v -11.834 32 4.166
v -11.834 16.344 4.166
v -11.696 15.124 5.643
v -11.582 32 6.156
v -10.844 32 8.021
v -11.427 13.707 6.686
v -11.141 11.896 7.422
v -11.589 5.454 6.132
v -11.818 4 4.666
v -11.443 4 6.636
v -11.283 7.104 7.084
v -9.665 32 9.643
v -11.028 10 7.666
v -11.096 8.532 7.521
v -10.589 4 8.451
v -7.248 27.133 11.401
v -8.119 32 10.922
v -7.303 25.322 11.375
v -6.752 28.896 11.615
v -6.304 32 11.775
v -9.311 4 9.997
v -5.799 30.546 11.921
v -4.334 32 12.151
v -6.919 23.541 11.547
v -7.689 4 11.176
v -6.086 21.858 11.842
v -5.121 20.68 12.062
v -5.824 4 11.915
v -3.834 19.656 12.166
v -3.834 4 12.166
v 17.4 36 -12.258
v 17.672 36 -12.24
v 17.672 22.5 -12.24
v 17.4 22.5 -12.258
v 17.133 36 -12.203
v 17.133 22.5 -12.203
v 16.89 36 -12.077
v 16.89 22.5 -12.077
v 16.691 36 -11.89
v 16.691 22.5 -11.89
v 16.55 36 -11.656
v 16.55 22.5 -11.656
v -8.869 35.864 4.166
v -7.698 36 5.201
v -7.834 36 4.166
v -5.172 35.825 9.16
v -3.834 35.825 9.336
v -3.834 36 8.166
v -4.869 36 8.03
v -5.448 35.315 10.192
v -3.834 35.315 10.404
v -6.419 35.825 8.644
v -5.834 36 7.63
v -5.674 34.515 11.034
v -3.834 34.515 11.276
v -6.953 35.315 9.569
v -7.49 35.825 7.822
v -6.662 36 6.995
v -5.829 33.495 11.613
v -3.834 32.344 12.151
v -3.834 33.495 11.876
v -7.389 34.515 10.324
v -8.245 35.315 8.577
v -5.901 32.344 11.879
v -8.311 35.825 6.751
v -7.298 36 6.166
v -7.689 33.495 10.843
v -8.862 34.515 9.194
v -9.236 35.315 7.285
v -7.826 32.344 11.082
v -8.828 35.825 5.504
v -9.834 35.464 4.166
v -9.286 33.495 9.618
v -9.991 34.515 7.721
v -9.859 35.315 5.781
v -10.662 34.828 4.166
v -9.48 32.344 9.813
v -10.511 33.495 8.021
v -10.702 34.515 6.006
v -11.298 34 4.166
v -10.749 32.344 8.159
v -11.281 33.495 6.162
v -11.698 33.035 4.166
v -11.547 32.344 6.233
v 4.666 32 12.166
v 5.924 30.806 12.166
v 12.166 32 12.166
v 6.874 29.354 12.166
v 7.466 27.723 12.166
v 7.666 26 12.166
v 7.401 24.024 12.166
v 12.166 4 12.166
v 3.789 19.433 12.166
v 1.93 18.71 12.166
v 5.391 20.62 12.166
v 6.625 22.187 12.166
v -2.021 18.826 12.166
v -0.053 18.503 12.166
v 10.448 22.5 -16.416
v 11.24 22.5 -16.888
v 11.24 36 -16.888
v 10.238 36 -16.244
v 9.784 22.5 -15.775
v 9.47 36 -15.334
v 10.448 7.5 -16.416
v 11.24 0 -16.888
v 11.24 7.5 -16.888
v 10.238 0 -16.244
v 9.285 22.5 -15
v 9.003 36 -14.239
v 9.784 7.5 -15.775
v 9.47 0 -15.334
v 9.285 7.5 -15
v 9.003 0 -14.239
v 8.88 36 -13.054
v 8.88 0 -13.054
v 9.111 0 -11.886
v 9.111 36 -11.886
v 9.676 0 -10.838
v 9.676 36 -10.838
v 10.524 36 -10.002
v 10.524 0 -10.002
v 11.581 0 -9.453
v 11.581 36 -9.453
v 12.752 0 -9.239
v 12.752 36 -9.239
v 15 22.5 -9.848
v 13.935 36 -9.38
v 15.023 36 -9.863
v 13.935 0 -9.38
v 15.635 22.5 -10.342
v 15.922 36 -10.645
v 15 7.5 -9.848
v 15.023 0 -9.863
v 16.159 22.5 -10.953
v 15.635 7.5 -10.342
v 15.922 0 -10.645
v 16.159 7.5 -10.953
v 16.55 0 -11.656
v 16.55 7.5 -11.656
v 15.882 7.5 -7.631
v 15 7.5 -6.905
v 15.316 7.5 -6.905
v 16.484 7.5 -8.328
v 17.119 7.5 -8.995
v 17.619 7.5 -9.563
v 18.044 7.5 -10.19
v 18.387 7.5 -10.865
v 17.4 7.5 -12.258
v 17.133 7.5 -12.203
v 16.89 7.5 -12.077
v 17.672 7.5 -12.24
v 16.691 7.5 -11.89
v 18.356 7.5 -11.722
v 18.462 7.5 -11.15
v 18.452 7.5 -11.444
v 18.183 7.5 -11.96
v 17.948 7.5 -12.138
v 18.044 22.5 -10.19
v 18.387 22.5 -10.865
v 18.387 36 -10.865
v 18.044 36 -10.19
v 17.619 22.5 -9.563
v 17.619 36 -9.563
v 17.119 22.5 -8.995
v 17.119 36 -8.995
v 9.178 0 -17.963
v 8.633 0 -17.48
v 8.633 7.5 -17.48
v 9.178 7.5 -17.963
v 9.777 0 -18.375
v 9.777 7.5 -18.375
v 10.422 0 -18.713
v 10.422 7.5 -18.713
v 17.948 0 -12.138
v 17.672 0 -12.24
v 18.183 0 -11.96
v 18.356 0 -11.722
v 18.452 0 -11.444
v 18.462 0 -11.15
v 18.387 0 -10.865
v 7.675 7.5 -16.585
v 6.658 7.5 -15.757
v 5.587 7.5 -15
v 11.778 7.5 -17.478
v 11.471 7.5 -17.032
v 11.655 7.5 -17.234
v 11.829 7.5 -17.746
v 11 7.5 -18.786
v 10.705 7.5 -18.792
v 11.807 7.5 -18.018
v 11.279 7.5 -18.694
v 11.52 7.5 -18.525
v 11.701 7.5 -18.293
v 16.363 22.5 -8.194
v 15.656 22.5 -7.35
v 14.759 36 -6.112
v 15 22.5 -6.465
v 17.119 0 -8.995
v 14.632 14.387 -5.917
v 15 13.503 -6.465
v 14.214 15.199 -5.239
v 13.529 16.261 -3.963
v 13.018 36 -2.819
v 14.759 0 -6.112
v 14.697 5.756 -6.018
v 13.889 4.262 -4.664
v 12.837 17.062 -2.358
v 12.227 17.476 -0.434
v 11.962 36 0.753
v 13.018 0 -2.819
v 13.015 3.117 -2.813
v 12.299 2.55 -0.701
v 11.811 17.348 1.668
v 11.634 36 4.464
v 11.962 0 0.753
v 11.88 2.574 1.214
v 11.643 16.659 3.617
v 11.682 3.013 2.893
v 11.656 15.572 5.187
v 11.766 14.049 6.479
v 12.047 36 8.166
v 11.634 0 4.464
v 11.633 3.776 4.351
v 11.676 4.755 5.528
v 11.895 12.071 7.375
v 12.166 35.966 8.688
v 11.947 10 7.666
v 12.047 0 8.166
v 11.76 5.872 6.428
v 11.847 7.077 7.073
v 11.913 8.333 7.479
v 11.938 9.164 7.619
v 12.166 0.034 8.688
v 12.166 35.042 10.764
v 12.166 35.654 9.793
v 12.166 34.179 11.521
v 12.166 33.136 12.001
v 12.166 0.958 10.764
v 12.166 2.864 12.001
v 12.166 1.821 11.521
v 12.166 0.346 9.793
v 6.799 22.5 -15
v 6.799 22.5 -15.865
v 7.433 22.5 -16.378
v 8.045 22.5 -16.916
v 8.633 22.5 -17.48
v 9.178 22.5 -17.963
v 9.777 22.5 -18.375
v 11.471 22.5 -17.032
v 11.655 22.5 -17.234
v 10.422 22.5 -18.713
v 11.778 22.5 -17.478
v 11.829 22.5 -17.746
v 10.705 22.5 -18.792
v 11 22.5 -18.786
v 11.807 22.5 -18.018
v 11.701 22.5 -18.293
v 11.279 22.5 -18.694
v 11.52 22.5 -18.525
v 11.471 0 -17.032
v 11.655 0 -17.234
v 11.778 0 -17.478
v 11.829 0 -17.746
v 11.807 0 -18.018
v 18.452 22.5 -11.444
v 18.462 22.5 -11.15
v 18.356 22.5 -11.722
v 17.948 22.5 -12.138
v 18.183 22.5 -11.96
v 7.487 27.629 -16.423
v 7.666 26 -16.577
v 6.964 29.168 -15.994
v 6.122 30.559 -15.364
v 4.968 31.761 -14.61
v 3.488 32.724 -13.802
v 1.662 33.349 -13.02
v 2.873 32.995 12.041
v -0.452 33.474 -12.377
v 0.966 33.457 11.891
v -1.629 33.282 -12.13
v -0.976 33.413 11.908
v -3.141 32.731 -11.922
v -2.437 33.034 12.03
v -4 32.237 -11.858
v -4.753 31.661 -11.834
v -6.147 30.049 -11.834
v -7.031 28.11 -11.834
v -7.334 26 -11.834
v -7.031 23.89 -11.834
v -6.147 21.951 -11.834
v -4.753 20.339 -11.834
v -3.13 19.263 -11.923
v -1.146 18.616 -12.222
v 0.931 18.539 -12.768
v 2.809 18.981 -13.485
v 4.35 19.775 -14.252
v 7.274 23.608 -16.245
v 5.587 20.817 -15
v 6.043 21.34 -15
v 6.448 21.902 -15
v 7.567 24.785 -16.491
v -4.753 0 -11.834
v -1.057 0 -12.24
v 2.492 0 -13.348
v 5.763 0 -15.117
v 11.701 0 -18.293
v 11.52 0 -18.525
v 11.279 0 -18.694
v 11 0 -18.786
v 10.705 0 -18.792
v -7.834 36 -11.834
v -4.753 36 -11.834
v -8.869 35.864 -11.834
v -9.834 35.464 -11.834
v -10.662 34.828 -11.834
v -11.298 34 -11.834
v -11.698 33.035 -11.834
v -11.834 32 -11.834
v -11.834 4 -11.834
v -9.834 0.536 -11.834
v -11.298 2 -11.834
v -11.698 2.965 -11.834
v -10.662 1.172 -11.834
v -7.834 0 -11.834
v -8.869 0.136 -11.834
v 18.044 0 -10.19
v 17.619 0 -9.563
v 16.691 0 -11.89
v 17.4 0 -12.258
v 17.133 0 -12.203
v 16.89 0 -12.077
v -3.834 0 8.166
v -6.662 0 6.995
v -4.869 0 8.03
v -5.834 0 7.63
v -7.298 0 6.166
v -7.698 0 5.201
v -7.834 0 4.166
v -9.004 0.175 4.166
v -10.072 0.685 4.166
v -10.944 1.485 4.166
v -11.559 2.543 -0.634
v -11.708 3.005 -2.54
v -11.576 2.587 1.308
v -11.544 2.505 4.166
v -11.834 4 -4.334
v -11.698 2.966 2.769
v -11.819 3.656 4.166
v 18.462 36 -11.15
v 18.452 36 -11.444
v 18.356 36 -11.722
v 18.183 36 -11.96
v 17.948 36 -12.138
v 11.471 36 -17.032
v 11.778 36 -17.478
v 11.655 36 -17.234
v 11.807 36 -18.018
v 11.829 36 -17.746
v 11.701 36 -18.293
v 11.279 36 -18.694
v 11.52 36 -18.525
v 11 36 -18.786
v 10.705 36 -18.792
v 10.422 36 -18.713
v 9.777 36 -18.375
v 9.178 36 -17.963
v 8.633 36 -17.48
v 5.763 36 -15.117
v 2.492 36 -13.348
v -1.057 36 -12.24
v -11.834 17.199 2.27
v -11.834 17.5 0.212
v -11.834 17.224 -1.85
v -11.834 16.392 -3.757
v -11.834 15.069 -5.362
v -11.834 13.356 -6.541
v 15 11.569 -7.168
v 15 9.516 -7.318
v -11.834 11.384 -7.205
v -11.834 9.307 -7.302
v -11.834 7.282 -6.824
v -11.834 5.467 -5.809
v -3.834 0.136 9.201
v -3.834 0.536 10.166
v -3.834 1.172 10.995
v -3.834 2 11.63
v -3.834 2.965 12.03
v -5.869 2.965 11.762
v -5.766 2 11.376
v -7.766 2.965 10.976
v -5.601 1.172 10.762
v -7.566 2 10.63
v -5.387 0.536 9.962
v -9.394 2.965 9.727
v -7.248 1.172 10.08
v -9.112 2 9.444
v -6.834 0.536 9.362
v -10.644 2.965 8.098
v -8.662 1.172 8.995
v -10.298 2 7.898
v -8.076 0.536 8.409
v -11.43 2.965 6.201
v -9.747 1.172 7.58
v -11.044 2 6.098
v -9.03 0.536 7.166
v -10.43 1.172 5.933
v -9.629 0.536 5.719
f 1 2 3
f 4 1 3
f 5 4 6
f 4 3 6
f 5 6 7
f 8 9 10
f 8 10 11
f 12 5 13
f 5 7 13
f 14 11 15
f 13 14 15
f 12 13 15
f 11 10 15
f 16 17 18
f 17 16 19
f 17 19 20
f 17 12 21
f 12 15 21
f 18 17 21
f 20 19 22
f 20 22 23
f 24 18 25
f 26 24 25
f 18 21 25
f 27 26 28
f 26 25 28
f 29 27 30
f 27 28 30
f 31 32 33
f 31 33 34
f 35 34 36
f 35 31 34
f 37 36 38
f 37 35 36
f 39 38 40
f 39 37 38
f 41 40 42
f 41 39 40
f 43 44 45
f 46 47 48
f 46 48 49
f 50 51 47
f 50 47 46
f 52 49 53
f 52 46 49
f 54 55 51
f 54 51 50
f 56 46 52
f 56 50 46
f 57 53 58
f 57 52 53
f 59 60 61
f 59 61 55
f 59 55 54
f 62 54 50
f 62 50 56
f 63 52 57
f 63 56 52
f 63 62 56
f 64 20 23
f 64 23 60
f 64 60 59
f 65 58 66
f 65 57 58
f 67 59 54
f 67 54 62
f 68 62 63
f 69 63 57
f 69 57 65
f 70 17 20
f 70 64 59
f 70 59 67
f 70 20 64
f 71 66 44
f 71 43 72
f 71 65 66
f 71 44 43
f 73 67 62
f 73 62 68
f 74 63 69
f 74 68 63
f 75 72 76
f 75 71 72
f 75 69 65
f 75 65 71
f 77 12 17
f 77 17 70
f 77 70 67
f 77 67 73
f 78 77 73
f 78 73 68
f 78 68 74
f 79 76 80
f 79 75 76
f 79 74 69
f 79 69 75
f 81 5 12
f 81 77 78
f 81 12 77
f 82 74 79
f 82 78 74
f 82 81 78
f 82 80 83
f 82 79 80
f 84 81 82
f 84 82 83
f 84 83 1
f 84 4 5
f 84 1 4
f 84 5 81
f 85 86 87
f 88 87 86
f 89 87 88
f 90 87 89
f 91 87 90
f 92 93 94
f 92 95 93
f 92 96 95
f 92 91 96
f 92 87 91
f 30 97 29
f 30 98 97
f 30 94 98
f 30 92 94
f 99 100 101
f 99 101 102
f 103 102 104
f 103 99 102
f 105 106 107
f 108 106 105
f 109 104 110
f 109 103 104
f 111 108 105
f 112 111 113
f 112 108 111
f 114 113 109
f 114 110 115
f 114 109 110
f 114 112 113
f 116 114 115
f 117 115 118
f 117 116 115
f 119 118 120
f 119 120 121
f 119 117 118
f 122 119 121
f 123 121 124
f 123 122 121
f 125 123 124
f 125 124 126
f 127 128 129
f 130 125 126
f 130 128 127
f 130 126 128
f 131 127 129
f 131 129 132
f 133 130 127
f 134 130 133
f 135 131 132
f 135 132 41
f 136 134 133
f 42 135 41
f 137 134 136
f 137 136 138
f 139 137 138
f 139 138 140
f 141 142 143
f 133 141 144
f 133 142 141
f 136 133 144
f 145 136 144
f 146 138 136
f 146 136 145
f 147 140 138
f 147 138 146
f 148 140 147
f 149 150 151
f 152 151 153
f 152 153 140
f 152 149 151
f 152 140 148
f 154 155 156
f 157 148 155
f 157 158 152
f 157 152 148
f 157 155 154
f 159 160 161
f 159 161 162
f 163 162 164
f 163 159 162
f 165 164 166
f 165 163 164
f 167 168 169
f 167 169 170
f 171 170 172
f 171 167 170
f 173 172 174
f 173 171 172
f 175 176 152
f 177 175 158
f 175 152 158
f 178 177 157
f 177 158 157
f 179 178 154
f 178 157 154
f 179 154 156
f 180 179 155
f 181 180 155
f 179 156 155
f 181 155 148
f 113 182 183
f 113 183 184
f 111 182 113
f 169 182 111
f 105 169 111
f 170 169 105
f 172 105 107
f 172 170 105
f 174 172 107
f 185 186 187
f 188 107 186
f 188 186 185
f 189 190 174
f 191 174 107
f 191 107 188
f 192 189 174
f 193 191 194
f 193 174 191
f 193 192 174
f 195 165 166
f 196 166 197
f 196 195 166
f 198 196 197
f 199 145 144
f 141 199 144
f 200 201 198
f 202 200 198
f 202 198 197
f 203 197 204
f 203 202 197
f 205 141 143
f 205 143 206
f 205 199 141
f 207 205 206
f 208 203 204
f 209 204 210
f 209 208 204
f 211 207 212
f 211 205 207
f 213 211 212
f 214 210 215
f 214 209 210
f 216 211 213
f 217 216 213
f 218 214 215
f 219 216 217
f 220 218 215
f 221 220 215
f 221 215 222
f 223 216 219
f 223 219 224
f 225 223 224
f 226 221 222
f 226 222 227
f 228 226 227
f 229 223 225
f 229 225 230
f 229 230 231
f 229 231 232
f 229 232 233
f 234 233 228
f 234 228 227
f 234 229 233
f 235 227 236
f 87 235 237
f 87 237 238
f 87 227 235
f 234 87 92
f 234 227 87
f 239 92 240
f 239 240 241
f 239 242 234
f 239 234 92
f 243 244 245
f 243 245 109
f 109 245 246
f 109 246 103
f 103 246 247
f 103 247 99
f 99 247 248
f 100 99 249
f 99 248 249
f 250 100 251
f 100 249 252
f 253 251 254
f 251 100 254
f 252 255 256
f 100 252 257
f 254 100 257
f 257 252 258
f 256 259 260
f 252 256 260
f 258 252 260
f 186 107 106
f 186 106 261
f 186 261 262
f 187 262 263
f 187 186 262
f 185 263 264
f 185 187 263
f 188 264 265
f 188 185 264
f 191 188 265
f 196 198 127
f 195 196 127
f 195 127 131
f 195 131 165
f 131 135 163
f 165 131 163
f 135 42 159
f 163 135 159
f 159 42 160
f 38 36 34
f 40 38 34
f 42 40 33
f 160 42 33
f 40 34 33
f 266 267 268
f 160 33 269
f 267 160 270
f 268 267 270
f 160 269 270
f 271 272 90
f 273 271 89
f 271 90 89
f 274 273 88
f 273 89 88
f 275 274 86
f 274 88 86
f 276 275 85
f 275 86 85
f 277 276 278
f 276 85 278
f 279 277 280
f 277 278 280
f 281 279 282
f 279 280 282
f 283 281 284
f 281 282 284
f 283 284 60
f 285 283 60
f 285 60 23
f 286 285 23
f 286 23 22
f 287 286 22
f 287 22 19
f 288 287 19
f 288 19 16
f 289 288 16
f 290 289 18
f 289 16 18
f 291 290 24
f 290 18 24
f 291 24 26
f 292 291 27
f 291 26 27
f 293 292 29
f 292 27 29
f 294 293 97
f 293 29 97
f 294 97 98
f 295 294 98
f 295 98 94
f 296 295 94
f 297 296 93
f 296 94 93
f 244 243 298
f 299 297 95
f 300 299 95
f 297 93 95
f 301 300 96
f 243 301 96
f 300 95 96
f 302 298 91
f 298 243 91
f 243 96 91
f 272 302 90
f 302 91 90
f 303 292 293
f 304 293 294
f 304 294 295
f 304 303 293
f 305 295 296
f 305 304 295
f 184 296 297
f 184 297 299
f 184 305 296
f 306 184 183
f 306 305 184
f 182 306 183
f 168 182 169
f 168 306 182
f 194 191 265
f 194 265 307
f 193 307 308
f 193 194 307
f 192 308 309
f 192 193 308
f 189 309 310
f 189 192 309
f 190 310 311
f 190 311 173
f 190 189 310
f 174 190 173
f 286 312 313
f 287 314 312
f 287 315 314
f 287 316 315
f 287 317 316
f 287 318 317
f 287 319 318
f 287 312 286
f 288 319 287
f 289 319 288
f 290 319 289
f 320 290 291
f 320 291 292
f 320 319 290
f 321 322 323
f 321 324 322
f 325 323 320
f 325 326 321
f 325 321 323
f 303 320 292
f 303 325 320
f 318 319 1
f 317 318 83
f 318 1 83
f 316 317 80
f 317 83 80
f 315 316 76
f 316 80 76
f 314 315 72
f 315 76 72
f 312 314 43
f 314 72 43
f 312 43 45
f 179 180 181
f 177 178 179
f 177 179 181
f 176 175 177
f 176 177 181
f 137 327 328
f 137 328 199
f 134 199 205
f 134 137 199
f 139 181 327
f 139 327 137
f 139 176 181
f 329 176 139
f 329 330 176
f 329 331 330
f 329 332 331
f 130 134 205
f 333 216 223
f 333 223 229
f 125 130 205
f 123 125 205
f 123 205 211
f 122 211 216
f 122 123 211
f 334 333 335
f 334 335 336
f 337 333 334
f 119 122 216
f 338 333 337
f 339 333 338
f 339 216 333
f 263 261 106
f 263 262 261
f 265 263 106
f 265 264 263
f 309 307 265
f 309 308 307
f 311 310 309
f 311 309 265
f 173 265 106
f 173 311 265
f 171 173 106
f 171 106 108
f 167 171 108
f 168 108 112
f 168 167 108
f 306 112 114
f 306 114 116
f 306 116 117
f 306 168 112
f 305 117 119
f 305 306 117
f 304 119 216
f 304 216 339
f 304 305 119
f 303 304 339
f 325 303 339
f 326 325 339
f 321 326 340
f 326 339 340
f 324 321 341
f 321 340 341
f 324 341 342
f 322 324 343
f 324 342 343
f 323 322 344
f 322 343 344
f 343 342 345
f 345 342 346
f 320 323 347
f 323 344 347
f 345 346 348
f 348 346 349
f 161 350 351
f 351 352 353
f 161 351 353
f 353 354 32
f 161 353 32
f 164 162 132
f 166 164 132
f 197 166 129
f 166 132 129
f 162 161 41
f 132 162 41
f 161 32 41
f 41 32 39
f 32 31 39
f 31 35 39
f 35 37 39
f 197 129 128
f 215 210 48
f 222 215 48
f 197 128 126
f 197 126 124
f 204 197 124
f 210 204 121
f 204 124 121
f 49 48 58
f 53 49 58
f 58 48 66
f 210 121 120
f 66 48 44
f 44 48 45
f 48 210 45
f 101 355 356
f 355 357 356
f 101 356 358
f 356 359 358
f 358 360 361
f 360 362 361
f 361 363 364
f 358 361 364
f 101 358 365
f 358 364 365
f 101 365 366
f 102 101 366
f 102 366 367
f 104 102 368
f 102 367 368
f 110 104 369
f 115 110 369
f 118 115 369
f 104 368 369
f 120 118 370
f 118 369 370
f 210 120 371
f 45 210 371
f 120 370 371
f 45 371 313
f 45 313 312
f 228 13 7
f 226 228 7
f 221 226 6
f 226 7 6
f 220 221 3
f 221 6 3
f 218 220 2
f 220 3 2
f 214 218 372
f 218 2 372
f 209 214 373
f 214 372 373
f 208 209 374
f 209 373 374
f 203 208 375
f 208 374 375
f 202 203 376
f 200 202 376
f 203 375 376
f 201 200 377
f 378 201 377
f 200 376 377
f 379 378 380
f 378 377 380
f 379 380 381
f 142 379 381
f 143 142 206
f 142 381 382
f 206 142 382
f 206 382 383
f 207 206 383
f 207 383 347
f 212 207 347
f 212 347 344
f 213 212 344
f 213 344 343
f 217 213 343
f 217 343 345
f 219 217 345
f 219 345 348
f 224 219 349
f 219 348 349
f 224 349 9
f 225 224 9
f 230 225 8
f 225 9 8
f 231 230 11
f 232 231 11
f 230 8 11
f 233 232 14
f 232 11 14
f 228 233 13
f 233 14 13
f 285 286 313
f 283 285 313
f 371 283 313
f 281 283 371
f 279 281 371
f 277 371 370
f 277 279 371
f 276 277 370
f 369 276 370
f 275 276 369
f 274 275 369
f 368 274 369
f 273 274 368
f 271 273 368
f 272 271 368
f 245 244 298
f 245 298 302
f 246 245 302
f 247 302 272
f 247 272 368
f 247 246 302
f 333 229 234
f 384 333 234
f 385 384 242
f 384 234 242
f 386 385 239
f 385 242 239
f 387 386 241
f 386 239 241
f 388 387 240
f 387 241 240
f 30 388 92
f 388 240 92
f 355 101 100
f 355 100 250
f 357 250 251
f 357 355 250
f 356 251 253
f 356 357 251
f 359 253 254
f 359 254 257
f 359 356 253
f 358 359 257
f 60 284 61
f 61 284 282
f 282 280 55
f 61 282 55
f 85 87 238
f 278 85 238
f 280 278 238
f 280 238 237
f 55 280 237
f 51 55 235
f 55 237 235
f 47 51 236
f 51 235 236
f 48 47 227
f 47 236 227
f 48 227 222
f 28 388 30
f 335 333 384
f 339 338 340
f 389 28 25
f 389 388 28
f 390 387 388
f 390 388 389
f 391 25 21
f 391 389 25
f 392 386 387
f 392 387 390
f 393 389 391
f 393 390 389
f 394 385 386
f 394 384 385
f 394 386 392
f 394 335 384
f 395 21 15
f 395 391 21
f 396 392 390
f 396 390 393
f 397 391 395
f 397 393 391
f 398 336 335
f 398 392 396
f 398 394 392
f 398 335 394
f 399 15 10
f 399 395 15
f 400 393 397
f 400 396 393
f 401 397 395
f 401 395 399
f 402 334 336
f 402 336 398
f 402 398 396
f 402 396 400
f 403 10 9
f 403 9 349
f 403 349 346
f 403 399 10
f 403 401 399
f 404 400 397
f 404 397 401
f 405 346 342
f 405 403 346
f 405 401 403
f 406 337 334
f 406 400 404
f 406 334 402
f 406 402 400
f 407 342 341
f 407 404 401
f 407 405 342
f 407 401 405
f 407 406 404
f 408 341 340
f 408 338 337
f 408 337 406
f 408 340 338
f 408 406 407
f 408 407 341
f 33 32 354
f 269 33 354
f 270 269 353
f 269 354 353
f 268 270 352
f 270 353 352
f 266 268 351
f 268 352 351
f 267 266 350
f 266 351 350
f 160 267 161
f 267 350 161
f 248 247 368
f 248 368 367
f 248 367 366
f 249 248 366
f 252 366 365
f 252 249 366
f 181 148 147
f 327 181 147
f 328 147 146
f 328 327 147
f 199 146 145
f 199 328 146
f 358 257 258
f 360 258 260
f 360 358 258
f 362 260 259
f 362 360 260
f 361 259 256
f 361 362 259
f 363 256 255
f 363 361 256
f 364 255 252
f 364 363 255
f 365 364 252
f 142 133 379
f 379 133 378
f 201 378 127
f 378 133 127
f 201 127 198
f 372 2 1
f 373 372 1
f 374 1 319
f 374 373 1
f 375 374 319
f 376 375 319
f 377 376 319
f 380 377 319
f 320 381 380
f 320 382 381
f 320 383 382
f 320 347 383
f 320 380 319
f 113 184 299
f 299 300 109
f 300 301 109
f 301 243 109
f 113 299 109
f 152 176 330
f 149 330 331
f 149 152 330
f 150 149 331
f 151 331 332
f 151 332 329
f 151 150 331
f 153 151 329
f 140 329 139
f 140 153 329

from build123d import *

# Parameters (mm, degrees)
BOSS_EXTRUDE1_DEPTH = 36
SKETCH2_R           = 7.5
CUT_EXTRUDE1_DEPTH  = 51.950145011
SKETCH3_R           = 7.5
CUT_EXTRUDE2_DEPTH  = 52.231763324
FILLET1_R           = 8
FILLET2_R           = 4
FILLET3_R           = 1
FILLET4_R           = 1
CUT_EXTRUDE3_DEPTH  = 7.5


# Some blends are built 0.0001 mm under size
with BuildPart() as part:
    # Sketch1 → Boss-Extrude1 (new body)
    with BuildSketch(Plane(origin=(0, 0, 0), x_dir=(1, 0, 0), z_dir=(0, 1, 0))):
        with BuildLine():
            Line((12.166155414, -12.166155414), (-11.833844586, -12.166155414))
            Line((-11.833844586, -12.166155414), (-11.833844586, 11.833844586))
            Line((-11.833844586, 11.833844586), (-4.753315898, 11.833844586))
            ThreePointArc((-4.753315898, 11.833844586), (2.492071873, 13.348010377), (8.633253511, 17.480107918))
            ThreePointArc((8.633253511, 17.480107918), (9.98514832, 18.495184251), (11.566536194, 19.09285634))
            Line((11.566536194, 19.09285634), (12.002988862, 17.14105997))
            ThreePointArc((12.002988862, 17.14105997), (10.068614763, 10.388049365), (16.792058069, 12.422813601))
            Line((16.792058069, 12.422813601), (18.750140005, 12.015486787))
            ThreePointArc((18.750140005, 12.015486787), (18.154998777, 10.385966776), (17.118534885, 8.994826544))
            ThreePointArc((17.118534885, 8.994826544), (12.32659232, 0.801901017), (12.166155414, -8.688146518))
            Line((12.166155414, -8.688146518), (12.166155414, -12.166155414))
        make_face()
    extrude(amount=BOSS_EXTRUDE1_DEPTH)

    # Sketch2 → Cut-Extrude1 (cut, through all)
    with BuildSketch(Plane.ZY.offset(11.833844586)):
        with Locations((0.166155414, 10)):
            Circle(SKETCH2_R)
    extrude(amount=-CUT_EXTRUDE1_DEPTH, mode=Mode.SUBTRACT)

    # Sketch3 → Cut-Extrude2 (cut, through all)
    with BuildSketch(Plane.XY.offset(12.166155414)):
        with Locations((0.166155414, 26)):
            Circle(SKETCH3_R)
    extrude(amount=-CUT_EXTRUDE2_DEPTH, mode=Mode.SUBTRACT)

    # Fillet1
    # the kernel refuses this fillet: 8 mm, written as the material it takes off along each edge
    with BuildSketch(Plane(origin=(-11.833844586, -20, 12.166155414), x_dir=(1, 0, 0), z_dir=(0, 1, 0))) as fillet1_piece_1:
        with BuildLine():
            CenterArc((FILLET1_R, FILLET1_R), FILLET1_R, 180, 90)
            Line((0, FILLET1_R), (0, 0))
            Line((0, 0), (FILLET1_R, 0))
        make_face()
    extrude(amount=76, mode=Mode.SUBTRACT)

    # Fillet2
    # the kernel refuses this fillet: 4 mm, written as the material it takes off along each edge
    with BuildSketch(Plane(origin=(-11.833844586, 0, 4.166155414), x_dir=(1, 0, 0), z_dir=(0, 0, -1)), Plane(origin=(22.166155414, 36, 12.166155414), x_dir=(0, -1, 0), z_dir=(-1, 0, 0))) as fillet2_piece_1:
        with BuildLine():
            CenterArc((FILLET2_R, -FILLET2_R), FILLET2_R, 90, 90)
            Line((0, -FILLET2_R), (0, 0))
            Line((0, 0), (FILLET2_R, 0))
        make_face()
    extrude(amount=26, mode=Mode.SUBTRACT)
    with BuildSketch(Plane(origin=(-3.833844586, 0, 4.166155414), x_dir=(0, 0, 1), z_dir=(1, 0, 0))) as fillet2_piece_2:
        with BuildLine():
            CenterArc((8 - FILLET2_R, -FILLET2_R), FILLET2_R, 0, 90)
            Line((8, -FILLET2_R), (8, 0))
            Line((8, 0), (8 - FILLET2_R, 0))
        make_face()
    revolve(axis=Axis((-3.833844586, 0, 4.166155414), (0, -1, 0)), revolution_arc=90, mode=Mode.SUBTRACT)
    with BuildSketch(Plane(origin=(-3.833844586, 36, 4.166155414), x_dir=(0, 0, 1), z_dir=(1, 0, 0))) as fillet2_piece_3:
        with BuildLine():
            CenterArc((8 - FILLET2_R, FILLET2_R), FILLET2_R, 270, 90)
            Line((8, FILLET2_R), (8, 0))
            Line((8, 0), (8 - FILLET2_R, 0))
        make_face()
    revolve(axis=Axis((-3.833844586, 36, 4.166155414), (0, -1, 0)), revolution_arc=90, mode=Mode.SUBTRACT)
    with BuildSketch(Plane(origin=(22.166155414, 0, 12.166155414), x_dir=(0, 1, 0), z_dir=(-1, 0, 0)), Plane(origin=(-11.833844586, 36, 4.166155414), x_dir=(1, 0, 0), z_dir=(0, 0, -1))) as fillet2_piece_4:
        with BuildLine():
            CenterArc((FILLET2_R, FILLET2_R), FILLET2_R, 180, 90)
            Line((0, FILLET2_R), (0, 0))
            Line((0, 0), (FILLET2_R, 0))
        make_face()
    extrude(amount=26, mode=Mode.SUBTRACT)

    # Fillet3
    fillet3_edges = [part.edges().sort_by_distance(p)[0] for p in [
        (12.002988862, 18, -17.14105997),
        (16.792058069, 18, -12.422813601),
    ]]
    fillet(fillet3_edges, radius=FILLET3_R)

    # Fillet4
    fillet4_edges = [part.edges().sort_by_distance(p)[0] for p in [
        (11.566536194, 18, -19.09285634),
        (18.750140005, 18, -12.015486787),
    ]]
    fillet(fillet4_edges, radius=FILLET4_R - 0.0001)  # a hair under: the kernel refuses the full size

    # Sketch4 → Cut-Extrude3 (cut, symmetric)
    with BuildSketch(Plane(origin=(0, 15, 0), x_dir=(1, 0, 0), z_dir=(0, 1, 0))):
        Polygon((15, 15), (15, 0), (27.823989989, 3.609418598), (23.424788661, 30.402201484), (6.171676897, 29.445037867), (0, 15), align=None)
    extrude(amount=CUT_EXTRUDE3_DEPTH, both=True, mode=Mode.SUBTRACT)


solid = part.part
